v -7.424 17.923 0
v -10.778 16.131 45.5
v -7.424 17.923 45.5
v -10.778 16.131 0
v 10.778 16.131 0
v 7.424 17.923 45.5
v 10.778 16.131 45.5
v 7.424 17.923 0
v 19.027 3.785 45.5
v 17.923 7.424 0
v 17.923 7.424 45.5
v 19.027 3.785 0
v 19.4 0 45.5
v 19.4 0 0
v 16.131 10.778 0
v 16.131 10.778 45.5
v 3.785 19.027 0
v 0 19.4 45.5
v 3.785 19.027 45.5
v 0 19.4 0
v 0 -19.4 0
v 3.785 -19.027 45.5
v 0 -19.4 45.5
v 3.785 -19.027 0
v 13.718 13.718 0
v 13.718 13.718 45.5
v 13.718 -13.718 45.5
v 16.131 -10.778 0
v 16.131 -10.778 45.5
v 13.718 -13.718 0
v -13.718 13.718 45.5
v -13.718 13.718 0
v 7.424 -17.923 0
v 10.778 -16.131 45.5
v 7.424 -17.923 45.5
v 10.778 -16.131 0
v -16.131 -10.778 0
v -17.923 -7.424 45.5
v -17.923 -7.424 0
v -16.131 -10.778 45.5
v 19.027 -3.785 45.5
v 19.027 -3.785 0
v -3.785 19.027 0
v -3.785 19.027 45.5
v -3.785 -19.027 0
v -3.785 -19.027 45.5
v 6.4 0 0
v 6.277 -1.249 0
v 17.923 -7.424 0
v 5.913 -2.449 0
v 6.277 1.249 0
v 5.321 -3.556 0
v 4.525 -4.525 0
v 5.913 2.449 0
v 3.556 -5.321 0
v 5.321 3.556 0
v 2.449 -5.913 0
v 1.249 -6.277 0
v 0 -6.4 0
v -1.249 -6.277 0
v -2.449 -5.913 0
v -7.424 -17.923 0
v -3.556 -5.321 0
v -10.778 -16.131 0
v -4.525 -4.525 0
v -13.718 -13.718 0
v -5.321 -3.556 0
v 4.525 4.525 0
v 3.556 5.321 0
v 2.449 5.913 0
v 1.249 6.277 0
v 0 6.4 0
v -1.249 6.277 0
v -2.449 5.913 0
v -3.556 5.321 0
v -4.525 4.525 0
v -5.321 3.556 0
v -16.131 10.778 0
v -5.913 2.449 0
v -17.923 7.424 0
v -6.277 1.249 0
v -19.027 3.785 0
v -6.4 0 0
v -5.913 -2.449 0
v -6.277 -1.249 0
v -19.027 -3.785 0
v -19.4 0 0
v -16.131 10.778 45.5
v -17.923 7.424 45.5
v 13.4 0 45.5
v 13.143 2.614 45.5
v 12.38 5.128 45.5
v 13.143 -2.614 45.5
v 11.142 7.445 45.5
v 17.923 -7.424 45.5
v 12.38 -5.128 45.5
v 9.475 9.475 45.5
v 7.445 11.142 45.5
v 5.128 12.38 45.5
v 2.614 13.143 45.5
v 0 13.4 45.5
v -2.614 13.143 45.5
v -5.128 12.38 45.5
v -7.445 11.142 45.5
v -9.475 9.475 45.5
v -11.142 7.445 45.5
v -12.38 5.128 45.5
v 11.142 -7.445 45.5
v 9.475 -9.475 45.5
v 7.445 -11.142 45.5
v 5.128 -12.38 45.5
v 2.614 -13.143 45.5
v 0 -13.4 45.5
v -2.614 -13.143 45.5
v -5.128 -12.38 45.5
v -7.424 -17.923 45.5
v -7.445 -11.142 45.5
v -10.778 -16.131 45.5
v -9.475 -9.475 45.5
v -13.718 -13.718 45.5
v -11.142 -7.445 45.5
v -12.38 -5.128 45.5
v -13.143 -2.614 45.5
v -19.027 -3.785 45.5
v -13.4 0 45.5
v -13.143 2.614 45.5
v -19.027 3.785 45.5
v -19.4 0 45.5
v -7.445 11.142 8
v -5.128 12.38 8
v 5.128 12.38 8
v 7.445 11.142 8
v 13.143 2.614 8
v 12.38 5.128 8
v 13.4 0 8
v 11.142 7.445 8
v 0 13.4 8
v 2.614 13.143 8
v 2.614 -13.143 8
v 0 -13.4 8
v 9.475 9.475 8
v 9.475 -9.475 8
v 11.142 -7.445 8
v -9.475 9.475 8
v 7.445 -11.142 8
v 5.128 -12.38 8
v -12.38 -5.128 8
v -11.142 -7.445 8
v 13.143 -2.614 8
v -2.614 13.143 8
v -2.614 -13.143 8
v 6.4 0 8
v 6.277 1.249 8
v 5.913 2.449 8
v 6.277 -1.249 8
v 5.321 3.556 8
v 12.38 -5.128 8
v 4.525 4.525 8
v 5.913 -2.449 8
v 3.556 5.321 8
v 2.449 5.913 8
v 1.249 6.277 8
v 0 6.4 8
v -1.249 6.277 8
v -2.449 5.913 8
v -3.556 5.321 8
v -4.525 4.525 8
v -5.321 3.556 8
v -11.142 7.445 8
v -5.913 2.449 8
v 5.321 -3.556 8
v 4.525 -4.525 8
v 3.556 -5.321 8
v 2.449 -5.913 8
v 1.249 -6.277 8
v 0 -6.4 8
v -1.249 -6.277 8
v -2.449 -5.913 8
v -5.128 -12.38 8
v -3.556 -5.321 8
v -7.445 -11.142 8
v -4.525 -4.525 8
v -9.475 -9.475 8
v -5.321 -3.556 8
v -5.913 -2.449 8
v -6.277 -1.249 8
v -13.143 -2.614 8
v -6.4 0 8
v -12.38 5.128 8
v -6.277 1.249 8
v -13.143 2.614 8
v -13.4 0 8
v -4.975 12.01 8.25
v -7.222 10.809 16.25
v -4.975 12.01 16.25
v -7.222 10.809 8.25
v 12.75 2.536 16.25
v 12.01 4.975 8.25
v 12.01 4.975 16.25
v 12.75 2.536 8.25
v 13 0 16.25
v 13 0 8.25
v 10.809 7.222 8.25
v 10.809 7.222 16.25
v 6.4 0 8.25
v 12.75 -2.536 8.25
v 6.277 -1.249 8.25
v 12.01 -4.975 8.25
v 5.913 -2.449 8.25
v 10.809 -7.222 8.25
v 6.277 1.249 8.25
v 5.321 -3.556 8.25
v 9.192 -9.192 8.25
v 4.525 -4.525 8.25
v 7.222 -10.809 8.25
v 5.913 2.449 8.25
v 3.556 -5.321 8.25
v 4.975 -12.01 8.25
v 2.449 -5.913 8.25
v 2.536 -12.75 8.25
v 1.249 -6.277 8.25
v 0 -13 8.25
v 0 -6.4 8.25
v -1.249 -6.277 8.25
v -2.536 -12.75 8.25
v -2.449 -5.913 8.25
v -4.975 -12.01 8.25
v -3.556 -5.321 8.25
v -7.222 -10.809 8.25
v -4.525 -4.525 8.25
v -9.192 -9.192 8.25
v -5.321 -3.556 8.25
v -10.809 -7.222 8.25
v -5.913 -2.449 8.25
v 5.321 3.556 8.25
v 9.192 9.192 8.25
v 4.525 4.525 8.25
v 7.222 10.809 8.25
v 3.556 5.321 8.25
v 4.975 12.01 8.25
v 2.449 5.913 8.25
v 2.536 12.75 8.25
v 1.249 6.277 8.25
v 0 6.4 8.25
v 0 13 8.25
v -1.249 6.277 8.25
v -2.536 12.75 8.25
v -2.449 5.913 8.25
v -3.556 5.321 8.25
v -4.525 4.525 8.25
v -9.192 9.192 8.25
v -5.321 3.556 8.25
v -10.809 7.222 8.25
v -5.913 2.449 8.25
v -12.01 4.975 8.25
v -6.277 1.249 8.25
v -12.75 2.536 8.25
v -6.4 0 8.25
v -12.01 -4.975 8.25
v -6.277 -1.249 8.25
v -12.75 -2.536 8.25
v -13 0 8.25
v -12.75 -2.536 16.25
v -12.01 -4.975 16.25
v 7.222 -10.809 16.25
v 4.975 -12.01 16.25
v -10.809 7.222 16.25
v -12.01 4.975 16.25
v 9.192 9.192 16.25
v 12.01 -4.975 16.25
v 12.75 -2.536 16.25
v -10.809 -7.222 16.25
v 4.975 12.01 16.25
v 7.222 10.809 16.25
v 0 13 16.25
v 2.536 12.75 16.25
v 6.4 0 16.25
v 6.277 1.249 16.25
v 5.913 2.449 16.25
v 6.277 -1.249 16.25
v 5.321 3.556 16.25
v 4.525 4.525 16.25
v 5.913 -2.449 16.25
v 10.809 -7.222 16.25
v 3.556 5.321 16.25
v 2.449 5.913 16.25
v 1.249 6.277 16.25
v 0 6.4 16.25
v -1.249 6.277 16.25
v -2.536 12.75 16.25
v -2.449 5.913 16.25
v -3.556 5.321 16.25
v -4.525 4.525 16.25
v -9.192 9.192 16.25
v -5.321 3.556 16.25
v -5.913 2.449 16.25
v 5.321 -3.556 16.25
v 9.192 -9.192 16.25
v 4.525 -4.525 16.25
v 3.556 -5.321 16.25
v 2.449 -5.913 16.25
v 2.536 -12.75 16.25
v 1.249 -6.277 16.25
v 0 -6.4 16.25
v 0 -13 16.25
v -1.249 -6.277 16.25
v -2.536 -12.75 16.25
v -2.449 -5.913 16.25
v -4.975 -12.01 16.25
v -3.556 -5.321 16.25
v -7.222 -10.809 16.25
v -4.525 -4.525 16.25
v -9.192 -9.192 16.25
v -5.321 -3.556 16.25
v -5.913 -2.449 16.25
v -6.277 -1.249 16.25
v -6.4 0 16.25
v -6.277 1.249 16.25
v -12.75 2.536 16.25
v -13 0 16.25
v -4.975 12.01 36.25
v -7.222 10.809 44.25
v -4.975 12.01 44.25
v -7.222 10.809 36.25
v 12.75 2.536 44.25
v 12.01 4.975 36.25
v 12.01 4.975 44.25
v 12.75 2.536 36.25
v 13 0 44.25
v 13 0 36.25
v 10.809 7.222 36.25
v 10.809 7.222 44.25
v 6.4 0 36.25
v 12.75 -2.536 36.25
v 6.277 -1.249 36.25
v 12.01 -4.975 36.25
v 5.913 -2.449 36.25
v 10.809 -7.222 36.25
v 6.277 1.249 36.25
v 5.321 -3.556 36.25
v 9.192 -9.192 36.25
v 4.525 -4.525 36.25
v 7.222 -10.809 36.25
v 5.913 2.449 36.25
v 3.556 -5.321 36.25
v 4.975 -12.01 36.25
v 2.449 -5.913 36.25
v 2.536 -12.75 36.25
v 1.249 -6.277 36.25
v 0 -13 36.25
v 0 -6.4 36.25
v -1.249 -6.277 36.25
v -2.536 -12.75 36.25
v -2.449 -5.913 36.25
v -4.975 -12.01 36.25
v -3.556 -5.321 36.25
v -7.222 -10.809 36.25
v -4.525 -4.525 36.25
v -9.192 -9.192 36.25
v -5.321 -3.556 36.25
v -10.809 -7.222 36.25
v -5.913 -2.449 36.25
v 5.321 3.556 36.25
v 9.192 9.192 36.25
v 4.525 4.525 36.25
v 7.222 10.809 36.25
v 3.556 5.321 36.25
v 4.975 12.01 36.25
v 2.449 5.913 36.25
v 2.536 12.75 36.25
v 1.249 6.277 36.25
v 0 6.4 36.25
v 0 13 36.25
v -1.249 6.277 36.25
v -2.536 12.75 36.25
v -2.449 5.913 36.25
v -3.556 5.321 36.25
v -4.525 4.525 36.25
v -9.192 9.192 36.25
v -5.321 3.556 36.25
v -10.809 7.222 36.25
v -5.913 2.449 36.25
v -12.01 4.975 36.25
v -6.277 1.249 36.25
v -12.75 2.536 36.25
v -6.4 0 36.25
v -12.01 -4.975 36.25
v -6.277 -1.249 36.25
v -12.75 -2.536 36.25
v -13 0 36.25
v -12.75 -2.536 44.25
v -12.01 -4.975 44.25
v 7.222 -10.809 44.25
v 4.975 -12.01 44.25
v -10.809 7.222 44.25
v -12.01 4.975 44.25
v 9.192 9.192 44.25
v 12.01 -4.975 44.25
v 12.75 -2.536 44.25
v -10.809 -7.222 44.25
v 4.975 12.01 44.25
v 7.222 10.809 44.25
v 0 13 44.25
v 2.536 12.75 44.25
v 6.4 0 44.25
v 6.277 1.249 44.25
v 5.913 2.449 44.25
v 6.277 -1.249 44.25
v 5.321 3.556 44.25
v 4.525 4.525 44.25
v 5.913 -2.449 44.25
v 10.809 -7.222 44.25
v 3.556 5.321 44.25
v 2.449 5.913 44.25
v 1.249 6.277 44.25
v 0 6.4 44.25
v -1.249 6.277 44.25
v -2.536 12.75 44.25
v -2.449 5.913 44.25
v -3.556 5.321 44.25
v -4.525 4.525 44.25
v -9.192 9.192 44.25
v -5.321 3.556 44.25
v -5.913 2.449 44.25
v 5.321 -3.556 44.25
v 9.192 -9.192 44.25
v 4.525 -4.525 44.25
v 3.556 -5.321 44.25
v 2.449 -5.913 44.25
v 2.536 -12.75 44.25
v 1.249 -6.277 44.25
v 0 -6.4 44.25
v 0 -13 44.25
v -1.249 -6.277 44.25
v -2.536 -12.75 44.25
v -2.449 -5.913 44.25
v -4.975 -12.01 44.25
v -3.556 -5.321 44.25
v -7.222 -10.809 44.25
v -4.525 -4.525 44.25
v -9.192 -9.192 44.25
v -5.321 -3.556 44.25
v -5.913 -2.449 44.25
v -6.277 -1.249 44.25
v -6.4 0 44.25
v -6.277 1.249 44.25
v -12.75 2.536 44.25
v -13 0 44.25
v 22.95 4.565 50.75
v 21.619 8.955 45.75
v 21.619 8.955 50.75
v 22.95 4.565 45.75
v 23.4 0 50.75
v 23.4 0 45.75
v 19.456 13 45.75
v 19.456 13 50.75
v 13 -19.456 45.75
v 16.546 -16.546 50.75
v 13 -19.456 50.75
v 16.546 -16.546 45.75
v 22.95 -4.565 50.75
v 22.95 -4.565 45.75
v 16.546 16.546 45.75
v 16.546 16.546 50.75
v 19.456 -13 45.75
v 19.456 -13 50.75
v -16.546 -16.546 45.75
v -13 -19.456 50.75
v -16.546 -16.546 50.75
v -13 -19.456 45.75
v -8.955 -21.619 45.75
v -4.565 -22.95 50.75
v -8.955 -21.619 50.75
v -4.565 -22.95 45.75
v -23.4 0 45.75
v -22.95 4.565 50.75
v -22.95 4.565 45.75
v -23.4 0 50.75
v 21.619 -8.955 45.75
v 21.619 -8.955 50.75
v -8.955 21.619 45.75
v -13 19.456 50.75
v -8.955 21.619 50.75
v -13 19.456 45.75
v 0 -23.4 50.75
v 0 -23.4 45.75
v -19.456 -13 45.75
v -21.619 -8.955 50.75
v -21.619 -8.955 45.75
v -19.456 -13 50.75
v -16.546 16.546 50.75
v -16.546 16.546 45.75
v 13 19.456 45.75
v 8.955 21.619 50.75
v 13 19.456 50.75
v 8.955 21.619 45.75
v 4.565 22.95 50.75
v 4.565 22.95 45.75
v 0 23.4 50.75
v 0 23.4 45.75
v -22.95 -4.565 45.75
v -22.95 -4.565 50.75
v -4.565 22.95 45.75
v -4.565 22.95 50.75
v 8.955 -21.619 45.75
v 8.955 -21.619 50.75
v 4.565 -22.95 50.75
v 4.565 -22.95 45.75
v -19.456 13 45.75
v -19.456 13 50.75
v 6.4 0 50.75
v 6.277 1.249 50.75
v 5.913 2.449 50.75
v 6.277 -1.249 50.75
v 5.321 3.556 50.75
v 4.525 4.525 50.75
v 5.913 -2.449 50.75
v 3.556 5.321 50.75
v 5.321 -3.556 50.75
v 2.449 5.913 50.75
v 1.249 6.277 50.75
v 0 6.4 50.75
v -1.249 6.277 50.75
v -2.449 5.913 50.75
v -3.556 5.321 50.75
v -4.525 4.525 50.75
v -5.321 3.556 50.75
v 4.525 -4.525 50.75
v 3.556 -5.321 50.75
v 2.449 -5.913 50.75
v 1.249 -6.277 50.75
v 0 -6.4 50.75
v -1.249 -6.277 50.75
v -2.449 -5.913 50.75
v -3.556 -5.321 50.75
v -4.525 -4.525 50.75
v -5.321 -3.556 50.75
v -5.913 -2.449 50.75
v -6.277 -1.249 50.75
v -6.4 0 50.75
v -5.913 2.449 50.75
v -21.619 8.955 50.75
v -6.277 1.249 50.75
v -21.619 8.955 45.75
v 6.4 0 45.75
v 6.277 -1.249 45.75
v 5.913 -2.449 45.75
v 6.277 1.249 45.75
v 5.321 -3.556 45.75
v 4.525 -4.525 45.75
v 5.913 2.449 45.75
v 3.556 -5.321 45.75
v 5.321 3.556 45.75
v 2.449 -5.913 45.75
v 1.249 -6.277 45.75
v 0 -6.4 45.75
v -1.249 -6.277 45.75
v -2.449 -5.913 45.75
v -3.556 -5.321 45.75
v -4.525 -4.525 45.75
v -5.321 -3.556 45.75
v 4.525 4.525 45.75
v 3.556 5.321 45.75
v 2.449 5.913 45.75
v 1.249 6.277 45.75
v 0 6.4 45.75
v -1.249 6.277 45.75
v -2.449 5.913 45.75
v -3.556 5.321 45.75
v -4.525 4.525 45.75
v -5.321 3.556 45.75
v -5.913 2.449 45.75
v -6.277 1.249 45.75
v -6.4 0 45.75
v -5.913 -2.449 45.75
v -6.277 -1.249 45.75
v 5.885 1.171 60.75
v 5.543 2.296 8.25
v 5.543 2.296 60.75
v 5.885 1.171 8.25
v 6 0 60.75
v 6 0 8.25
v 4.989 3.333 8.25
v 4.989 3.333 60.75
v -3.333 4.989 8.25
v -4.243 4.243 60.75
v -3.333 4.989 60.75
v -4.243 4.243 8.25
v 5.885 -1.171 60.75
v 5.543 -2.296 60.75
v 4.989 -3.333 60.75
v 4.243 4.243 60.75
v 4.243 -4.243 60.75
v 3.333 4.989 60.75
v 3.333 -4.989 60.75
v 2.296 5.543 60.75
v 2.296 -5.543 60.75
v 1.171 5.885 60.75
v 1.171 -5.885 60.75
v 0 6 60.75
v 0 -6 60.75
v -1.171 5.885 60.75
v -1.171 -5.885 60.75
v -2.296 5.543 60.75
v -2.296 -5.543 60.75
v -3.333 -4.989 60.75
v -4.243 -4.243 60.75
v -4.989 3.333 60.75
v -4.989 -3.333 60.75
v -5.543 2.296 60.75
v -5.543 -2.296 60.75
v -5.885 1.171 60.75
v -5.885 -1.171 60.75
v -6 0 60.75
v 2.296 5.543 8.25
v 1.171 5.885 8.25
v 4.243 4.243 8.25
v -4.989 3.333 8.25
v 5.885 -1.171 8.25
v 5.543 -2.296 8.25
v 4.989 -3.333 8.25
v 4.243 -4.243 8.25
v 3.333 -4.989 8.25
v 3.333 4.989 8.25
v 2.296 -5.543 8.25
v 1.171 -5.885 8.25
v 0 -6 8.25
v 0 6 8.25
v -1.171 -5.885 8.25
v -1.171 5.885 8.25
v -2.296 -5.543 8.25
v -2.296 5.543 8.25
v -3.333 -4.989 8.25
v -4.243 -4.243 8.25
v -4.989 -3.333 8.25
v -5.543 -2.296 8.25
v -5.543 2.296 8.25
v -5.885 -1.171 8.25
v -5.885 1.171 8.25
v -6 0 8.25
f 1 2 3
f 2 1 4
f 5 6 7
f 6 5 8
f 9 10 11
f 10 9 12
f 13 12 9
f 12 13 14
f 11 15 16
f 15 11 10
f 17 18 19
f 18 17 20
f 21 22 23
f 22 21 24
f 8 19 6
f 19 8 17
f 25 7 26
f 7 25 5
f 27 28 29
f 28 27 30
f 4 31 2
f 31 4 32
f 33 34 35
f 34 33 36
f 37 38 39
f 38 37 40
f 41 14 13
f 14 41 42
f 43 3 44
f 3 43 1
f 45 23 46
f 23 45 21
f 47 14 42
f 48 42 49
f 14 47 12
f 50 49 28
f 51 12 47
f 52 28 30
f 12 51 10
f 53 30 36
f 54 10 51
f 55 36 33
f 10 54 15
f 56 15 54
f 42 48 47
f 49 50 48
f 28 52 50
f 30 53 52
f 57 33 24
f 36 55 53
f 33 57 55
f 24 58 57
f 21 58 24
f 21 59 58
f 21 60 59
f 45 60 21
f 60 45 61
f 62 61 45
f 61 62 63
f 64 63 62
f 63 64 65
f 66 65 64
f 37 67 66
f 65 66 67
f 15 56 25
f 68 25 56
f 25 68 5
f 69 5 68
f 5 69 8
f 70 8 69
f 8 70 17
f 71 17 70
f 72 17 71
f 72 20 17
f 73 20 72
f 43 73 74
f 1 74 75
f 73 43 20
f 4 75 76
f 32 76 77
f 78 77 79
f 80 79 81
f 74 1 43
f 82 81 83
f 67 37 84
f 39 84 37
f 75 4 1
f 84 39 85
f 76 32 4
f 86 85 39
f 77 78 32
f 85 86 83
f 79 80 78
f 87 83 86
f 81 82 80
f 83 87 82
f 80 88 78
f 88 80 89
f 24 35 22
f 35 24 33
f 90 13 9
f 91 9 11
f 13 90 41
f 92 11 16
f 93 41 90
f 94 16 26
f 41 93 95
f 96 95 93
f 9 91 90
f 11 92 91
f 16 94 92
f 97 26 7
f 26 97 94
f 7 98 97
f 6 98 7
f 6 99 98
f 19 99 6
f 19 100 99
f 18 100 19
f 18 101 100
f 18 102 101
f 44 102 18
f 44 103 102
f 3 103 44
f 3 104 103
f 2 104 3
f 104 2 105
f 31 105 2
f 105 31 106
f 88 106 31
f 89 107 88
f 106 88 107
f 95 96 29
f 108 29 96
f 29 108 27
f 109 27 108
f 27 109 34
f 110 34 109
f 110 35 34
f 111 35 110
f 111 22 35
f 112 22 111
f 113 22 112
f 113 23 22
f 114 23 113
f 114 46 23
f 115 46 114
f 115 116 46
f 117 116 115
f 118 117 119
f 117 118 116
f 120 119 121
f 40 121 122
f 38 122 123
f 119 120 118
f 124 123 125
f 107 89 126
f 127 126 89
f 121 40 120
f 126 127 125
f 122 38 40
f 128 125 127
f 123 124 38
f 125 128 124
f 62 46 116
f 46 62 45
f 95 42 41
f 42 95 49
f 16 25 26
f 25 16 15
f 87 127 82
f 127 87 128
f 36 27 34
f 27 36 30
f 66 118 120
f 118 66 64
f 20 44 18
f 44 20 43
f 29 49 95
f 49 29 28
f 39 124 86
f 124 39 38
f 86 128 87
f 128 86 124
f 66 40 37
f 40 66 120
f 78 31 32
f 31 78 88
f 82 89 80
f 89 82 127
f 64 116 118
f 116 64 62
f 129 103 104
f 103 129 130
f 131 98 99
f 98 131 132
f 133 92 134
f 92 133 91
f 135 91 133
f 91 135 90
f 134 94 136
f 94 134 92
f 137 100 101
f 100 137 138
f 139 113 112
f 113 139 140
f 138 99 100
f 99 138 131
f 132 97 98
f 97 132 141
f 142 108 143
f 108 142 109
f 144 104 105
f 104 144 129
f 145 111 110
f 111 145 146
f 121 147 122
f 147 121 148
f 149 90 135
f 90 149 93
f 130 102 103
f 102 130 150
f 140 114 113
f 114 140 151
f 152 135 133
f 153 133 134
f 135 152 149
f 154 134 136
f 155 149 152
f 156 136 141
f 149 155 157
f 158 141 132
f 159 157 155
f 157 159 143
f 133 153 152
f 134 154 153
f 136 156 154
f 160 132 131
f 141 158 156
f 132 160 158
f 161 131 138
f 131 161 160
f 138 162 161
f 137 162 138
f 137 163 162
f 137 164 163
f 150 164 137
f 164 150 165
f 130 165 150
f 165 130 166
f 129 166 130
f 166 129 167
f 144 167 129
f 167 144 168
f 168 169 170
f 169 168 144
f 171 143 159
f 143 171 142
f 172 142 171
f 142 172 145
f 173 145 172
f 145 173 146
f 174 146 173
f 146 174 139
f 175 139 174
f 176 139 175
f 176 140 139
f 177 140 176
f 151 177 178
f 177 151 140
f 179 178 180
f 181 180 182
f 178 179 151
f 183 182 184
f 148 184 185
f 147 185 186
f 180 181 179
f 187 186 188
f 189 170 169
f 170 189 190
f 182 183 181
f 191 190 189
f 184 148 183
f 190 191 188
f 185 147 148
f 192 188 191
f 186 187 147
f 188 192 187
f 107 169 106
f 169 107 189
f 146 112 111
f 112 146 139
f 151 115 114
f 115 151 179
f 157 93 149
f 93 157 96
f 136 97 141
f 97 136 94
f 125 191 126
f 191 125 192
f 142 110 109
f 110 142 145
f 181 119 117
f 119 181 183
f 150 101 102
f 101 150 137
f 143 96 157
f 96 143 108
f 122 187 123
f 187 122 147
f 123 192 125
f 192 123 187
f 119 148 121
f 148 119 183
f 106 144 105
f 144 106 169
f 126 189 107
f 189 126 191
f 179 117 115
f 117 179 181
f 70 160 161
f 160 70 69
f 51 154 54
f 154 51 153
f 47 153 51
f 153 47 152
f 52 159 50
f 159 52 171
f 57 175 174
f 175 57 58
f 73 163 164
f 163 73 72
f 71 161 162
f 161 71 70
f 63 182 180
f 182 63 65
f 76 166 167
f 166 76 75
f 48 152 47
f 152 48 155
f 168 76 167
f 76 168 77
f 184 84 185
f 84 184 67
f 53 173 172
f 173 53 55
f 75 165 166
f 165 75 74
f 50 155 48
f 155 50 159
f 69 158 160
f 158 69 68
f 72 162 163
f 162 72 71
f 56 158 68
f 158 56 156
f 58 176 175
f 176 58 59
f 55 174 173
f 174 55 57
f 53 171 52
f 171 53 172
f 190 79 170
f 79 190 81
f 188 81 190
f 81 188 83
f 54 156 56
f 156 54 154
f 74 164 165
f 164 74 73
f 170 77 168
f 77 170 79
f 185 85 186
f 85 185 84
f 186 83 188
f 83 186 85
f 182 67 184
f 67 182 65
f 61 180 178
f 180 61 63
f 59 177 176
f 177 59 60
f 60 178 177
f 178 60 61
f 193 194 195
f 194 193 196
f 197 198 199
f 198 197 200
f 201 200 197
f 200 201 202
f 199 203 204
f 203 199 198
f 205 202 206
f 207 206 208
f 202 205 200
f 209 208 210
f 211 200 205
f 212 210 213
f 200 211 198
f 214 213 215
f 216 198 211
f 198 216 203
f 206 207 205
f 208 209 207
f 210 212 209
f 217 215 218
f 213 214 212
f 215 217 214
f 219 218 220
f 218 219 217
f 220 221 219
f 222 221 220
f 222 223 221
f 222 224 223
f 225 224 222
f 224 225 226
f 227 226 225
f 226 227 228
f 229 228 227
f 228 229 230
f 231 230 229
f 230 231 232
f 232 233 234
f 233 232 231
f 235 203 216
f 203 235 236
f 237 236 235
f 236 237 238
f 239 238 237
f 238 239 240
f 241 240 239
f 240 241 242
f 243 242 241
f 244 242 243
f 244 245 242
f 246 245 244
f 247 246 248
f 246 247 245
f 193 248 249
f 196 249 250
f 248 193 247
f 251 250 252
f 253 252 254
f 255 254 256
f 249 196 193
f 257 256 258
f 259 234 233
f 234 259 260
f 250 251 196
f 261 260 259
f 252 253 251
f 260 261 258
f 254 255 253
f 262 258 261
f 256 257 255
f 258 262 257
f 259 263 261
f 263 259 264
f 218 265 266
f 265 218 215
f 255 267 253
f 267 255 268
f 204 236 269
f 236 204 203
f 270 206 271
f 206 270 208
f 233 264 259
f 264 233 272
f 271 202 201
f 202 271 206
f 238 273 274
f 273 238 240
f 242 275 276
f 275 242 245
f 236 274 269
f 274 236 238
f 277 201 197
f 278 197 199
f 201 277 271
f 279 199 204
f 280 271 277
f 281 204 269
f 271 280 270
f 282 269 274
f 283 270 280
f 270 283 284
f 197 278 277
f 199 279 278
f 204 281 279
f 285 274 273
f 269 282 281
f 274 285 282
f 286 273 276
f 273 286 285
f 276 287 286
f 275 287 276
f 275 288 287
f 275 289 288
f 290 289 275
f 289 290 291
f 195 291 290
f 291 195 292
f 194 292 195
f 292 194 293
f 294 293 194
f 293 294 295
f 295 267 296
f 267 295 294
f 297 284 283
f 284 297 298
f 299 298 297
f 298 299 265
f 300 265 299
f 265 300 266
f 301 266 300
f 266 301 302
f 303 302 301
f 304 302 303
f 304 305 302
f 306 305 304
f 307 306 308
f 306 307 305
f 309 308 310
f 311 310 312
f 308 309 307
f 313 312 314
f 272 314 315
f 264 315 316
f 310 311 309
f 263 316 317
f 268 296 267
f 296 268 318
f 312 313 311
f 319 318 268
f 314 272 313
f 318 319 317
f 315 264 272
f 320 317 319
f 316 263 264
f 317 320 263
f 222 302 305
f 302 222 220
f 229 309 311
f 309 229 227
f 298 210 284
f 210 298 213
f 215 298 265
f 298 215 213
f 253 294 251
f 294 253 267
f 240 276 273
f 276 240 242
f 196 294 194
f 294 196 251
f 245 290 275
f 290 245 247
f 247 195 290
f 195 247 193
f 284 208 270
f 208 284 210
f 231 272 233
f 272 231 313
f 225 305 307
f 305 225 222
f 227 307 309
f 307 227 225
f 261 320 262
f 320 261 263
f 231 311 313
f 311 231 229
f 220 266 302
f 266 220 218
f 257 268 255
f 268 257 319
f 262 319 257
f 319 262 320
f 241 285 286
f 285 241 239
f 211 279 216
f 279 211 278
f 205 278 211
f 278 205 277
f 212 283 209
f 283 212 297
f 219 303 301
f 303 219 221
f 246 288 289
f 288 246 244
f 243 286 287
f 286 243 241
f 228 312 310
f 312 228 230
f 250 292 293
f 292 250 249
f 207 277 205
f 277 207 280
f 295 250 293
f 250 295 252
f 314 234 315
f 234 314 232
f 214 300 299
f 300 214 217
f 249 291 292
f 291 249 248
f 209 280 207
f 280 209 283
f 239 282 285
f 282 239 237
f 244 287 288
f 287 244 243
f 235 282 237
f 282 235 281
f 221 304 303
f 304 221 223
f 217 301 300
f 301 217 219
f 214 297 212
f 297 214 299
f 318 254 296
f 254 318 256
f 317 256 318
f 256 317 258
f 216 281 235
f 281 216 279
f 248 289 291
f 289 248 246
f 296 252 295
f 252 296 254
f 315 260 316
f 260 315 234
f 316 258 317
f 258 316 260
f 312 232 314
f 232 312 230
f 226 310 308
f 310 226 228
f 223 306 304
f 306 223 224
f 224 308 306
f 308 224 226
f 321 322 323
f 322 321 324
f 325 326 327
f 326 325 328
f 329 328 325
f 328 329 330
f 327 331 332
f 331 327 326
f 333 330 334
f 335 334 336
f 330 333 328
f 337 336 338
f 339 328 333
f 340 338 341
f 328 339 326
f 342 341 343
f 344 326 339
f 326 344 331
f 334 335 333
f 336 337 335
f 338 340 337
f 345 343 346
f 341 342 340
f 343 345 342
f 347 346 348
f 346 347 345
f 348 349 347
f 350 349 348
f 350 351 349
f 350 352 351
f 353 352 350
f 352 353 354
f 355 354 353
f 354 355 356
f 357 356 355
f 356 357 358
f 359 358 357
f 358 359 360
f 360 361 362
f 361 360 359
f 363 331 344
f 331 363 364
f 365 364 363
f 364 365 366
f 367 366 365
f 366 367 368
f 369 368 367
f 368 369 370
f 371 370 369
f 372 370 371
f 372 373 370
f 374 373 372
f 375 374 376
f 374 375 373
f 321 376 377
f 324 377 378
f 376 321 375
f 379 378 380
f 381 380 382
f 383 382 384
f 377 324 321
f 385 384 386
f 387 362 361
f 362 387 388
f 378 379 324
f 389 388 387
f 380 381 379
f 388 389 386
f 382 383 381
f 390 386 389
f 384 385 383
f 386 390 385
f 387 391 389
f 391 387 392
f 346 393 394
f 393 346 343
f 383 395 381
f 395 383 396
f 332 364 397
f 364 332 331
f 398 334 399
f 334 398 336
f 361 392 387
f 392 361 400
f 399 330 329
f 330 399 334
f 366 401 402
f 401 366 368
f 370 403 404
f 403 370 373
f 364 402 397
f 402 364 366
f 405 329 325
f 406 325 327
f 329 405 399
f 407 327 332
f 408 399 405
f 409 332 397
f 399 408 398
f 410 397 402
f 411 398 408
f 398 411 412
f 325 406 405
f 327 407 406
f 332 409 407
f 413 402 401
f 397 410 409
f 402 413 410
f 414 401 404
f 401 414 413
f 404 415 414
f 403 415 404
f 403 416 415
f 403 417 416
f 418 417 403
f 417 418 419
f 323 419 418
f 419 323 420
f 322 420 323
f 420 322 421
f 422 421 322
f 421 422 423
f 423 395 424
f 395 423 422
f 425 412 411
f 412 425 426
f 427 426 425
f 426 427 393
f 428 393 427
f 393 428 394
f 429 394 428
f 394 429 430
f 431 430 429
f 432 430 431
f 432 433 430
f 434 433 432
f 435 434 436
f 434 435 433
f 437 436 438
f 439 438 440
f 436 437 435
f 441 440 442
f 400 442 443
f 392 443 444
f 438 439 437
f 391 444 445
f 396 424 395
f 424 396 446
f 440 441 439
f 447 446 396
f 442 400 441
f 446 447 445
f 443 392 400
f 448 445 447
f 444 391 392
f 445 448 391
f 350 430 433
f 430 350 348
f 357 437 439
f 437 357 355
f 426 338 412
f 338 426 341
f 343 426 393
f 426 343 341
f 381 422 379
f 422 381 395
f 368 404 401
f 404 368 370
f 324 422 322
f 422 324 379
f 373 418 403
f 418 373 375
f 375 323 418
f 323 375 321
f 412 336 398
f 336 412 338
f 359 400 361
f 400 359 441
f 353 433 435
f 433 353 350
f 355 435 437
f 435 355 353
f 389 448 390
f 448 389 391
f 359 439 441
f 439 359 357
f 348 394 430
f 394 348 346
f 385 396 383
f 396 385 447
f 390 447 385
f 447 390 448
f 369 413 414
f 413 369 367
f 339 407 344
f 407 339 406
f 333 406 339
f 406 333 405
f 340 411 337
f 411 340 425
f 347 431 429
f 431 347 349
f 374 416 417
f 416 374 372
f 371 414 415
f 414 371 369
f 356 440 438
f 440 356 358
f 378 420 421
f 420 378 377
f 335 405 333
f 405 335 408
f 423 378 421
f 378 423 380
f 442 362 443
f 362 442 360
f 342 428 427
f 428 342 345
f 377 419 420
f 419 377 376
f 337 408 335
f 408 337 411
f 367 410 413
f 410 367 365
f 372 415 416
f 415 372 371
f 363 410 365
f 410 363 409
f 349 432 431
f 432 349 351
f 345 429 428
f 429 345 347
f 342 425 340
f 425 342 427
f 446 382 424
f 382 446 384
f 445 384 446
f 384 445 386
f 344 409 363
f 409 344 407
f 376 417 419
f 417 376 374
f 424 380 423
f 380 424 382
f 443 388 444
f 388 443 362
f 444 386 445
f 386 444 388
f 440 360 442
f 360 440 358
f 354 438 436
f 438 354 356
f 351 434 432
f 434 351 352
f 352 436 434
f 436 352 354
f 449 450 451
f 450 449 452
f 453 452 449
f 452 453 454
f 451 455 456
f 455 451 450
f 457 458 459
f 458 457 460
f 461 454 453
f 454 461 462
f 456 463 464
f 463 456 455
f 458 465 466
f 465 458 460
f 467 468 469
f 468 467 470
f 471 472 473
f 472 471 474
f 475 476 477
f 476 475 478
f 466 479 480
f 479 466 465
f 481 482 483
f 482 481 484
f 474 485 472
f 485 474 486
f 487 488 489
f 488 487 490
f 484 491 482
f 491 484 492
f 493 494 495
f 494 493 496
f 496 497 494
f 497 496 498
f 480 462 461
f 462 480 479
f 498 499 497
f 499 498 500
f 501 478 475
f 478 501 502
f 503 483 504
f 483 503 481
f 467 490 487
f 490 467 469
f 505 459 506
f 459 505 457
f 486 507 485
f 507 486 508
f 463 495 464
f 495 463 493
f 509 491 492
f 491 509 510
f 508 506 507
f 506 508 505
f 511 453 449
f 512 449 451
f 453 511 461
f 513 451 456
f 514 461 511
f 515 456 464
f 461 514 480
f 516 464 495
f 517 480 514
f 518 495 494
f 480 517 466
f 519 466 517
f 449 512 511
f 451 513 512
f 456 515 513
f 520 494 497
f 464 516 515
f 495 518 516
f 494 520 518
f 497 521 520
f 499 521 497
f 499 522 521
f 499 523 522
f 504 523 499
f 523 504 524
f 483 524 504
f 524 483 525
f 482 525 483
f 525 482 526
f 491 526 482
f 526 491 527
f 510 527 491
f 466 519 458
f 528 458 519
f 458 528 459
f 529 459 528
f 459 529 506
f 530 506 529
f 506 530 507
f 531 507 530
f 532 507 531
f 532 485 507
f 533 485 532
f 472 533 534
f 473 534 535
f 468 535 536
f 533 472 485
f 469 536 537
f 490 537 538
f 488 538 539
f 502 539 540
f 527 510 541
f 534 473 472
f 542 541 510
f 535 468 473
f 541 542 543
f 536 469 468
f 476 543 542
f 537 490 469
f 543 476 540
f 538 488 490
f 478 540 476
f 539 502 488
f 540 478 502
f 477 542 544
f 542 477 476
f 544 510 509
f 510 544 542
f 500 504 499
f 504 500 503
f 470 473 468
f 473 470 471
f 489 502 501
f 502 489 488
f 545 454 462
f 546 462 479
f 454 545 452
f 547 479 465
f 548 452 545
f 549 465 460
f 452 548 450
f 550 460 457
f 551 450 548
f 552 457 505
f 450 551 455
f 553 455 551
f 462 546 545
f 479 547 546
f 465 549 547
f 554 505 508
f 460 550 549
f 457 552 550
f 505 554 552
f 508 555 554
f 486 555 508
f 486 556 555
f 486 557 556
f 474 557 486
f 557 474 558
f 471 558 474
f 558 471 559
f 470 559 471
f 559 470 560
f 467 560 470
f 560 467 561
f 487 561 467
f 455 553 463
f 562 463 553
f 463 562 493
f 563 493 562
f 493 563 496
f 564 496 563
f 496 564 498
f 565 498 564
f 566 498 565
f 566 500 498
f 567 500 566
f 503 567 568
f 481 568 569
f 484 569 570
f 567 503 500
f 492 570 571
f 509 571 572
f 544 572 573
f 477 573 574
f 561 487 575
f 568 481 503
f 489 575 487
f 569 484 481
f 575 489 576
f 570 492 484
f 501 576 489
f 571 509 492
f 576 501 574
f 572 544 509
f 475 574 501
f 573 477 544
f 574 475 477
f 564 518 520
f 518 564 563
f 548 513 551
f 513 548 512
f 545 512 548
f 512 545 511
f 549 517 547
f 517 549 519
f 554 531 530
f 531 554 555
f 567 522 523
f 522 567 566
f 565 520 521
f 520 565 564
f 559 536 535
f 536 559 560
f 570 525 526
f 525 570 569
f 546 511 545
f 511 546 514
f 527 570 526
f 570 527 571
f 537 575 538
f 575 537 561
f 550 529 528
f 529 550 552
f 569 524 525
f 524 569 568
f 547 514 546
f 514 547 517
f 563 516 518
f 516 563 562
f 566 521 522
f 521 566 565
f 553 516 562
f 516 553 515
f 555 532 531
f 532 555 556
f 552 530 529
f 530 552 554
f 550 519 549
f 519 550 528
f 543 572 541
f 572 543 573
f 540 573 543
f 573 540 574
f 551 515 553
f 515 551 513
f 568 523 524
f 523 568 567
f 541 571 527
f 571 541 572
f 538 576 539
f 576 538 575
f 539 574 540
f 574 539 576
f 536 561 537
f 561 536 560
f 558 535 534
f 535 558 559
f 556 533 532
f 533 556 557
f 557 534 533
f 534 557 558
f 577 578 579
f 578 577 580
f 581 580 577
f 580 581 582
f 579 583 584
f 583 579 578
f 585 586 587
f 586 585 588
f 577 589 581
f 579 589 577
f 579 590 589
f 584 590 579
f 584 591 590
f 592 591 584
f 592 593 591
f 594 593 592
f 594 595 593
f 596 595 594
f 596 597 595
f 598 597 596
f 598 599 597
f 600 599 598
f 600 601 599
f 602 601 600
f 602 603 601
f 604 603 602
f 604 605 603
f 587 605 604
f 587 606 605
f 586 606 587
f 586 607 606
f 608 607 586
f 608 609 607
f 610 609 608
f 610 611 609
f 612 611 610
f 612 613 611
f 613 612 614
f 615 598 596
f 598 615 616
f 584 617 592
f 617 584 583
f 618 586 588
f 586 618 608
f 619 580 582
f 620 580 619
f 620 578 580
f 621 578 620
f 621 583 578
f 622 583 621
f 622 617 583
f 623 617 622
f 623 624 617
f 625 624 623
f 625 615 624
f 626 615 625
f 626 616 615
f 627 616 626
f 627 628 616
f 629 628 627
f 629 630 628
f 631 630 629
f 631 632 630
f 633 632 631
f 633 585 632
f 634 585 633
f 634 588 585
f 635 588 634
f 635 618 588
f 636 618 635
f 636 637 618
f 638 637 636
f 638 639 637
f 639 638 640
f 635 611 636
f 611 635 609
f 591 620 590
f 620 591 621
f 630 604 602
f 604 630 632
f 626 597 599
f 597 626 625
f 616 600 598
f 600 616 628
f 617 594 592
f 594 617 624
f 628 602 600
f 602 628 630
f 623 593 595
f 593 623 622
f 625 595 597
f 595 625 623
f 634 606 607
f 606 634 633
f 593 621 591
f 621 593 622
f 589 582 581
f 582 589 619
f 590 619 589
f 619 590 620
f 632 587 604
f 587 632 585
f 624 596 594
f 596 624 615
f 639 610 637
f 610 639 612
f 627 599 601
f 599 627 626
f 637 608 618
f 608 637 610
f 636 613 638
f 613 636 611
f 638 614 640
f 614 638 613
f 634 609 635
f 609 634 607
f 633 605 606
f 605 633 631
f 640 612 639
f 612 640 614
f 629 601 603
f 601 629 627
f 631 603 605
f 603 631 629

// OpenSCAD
$fn = 32;

// ------------------------------------------------------------------------
// Shaft station: cup d38.8 x 45.5 mm, shaft d12
// Every part is its own module, assembly() places every instance.
// ------------------------------------------------------------------------

// --- part 1 ---
module housing_cup() {
  difference() {
    cylinder(h = 45.5, d = 38.8);
    translate([0, 0, 8]) cylinder(h = 38.5, d = 26.8);
    translate([0, 0, -1]) cylinder(h = 10, d = 12.8);
  }
}

// --- part 2 ---
module bearing_lower() {
  difference() {
      translate([0, 0, 0]) cylinder(h = 8, d = 26);
      translate([0, 0, -1]) cylinder(h = 10, d = 12.8);
    }
}

// --- part 3 ---
module bearing_upper() {
  difference() {
      translate([0, 0, 0]) cylinder(h = 8, d = 26);
      translate([0, 0, -1]) cylinder(h = 10, d = 12.8);
    }
}

// --- part 4 ---
module station_shaft() {
  translate([0, 0, -26.25]) cylinder(h = 52.5, d = 12);
}

// --- part 5 ---
module station_cover() {
  difference() {
    cylinder(h = 5, d = 46.8);
    translate([0, 0, -1]) cylinder(h = 7, d = 12.8);
  }
}

// --- assembly ---
module assembly() {
  color([0.80, 0.24, 0.20]) translate([0, 0, 0]) rotate([0, 0, 0]) housing_cup();
  color([0.20, 0.45, 0.75]) translate([0, 0, 8.25]) rotate([0, 0, 0]) bearing_lower();
  color([0.25, 0.62, 0.32]) translate([0, 0, 36.25]) rotate([0, 0, 0]) bearing_upper();
  color([0.92, 0.70, 0.18]) translate([0, 0, 34.5]) rotate([0, 0, 0]) station_shaft();
  color([0.58, 0.35, 0.70]) translate([0, 0, 45.75]) rotate([0, 0, 0]) station_cover();
}

assembly();
